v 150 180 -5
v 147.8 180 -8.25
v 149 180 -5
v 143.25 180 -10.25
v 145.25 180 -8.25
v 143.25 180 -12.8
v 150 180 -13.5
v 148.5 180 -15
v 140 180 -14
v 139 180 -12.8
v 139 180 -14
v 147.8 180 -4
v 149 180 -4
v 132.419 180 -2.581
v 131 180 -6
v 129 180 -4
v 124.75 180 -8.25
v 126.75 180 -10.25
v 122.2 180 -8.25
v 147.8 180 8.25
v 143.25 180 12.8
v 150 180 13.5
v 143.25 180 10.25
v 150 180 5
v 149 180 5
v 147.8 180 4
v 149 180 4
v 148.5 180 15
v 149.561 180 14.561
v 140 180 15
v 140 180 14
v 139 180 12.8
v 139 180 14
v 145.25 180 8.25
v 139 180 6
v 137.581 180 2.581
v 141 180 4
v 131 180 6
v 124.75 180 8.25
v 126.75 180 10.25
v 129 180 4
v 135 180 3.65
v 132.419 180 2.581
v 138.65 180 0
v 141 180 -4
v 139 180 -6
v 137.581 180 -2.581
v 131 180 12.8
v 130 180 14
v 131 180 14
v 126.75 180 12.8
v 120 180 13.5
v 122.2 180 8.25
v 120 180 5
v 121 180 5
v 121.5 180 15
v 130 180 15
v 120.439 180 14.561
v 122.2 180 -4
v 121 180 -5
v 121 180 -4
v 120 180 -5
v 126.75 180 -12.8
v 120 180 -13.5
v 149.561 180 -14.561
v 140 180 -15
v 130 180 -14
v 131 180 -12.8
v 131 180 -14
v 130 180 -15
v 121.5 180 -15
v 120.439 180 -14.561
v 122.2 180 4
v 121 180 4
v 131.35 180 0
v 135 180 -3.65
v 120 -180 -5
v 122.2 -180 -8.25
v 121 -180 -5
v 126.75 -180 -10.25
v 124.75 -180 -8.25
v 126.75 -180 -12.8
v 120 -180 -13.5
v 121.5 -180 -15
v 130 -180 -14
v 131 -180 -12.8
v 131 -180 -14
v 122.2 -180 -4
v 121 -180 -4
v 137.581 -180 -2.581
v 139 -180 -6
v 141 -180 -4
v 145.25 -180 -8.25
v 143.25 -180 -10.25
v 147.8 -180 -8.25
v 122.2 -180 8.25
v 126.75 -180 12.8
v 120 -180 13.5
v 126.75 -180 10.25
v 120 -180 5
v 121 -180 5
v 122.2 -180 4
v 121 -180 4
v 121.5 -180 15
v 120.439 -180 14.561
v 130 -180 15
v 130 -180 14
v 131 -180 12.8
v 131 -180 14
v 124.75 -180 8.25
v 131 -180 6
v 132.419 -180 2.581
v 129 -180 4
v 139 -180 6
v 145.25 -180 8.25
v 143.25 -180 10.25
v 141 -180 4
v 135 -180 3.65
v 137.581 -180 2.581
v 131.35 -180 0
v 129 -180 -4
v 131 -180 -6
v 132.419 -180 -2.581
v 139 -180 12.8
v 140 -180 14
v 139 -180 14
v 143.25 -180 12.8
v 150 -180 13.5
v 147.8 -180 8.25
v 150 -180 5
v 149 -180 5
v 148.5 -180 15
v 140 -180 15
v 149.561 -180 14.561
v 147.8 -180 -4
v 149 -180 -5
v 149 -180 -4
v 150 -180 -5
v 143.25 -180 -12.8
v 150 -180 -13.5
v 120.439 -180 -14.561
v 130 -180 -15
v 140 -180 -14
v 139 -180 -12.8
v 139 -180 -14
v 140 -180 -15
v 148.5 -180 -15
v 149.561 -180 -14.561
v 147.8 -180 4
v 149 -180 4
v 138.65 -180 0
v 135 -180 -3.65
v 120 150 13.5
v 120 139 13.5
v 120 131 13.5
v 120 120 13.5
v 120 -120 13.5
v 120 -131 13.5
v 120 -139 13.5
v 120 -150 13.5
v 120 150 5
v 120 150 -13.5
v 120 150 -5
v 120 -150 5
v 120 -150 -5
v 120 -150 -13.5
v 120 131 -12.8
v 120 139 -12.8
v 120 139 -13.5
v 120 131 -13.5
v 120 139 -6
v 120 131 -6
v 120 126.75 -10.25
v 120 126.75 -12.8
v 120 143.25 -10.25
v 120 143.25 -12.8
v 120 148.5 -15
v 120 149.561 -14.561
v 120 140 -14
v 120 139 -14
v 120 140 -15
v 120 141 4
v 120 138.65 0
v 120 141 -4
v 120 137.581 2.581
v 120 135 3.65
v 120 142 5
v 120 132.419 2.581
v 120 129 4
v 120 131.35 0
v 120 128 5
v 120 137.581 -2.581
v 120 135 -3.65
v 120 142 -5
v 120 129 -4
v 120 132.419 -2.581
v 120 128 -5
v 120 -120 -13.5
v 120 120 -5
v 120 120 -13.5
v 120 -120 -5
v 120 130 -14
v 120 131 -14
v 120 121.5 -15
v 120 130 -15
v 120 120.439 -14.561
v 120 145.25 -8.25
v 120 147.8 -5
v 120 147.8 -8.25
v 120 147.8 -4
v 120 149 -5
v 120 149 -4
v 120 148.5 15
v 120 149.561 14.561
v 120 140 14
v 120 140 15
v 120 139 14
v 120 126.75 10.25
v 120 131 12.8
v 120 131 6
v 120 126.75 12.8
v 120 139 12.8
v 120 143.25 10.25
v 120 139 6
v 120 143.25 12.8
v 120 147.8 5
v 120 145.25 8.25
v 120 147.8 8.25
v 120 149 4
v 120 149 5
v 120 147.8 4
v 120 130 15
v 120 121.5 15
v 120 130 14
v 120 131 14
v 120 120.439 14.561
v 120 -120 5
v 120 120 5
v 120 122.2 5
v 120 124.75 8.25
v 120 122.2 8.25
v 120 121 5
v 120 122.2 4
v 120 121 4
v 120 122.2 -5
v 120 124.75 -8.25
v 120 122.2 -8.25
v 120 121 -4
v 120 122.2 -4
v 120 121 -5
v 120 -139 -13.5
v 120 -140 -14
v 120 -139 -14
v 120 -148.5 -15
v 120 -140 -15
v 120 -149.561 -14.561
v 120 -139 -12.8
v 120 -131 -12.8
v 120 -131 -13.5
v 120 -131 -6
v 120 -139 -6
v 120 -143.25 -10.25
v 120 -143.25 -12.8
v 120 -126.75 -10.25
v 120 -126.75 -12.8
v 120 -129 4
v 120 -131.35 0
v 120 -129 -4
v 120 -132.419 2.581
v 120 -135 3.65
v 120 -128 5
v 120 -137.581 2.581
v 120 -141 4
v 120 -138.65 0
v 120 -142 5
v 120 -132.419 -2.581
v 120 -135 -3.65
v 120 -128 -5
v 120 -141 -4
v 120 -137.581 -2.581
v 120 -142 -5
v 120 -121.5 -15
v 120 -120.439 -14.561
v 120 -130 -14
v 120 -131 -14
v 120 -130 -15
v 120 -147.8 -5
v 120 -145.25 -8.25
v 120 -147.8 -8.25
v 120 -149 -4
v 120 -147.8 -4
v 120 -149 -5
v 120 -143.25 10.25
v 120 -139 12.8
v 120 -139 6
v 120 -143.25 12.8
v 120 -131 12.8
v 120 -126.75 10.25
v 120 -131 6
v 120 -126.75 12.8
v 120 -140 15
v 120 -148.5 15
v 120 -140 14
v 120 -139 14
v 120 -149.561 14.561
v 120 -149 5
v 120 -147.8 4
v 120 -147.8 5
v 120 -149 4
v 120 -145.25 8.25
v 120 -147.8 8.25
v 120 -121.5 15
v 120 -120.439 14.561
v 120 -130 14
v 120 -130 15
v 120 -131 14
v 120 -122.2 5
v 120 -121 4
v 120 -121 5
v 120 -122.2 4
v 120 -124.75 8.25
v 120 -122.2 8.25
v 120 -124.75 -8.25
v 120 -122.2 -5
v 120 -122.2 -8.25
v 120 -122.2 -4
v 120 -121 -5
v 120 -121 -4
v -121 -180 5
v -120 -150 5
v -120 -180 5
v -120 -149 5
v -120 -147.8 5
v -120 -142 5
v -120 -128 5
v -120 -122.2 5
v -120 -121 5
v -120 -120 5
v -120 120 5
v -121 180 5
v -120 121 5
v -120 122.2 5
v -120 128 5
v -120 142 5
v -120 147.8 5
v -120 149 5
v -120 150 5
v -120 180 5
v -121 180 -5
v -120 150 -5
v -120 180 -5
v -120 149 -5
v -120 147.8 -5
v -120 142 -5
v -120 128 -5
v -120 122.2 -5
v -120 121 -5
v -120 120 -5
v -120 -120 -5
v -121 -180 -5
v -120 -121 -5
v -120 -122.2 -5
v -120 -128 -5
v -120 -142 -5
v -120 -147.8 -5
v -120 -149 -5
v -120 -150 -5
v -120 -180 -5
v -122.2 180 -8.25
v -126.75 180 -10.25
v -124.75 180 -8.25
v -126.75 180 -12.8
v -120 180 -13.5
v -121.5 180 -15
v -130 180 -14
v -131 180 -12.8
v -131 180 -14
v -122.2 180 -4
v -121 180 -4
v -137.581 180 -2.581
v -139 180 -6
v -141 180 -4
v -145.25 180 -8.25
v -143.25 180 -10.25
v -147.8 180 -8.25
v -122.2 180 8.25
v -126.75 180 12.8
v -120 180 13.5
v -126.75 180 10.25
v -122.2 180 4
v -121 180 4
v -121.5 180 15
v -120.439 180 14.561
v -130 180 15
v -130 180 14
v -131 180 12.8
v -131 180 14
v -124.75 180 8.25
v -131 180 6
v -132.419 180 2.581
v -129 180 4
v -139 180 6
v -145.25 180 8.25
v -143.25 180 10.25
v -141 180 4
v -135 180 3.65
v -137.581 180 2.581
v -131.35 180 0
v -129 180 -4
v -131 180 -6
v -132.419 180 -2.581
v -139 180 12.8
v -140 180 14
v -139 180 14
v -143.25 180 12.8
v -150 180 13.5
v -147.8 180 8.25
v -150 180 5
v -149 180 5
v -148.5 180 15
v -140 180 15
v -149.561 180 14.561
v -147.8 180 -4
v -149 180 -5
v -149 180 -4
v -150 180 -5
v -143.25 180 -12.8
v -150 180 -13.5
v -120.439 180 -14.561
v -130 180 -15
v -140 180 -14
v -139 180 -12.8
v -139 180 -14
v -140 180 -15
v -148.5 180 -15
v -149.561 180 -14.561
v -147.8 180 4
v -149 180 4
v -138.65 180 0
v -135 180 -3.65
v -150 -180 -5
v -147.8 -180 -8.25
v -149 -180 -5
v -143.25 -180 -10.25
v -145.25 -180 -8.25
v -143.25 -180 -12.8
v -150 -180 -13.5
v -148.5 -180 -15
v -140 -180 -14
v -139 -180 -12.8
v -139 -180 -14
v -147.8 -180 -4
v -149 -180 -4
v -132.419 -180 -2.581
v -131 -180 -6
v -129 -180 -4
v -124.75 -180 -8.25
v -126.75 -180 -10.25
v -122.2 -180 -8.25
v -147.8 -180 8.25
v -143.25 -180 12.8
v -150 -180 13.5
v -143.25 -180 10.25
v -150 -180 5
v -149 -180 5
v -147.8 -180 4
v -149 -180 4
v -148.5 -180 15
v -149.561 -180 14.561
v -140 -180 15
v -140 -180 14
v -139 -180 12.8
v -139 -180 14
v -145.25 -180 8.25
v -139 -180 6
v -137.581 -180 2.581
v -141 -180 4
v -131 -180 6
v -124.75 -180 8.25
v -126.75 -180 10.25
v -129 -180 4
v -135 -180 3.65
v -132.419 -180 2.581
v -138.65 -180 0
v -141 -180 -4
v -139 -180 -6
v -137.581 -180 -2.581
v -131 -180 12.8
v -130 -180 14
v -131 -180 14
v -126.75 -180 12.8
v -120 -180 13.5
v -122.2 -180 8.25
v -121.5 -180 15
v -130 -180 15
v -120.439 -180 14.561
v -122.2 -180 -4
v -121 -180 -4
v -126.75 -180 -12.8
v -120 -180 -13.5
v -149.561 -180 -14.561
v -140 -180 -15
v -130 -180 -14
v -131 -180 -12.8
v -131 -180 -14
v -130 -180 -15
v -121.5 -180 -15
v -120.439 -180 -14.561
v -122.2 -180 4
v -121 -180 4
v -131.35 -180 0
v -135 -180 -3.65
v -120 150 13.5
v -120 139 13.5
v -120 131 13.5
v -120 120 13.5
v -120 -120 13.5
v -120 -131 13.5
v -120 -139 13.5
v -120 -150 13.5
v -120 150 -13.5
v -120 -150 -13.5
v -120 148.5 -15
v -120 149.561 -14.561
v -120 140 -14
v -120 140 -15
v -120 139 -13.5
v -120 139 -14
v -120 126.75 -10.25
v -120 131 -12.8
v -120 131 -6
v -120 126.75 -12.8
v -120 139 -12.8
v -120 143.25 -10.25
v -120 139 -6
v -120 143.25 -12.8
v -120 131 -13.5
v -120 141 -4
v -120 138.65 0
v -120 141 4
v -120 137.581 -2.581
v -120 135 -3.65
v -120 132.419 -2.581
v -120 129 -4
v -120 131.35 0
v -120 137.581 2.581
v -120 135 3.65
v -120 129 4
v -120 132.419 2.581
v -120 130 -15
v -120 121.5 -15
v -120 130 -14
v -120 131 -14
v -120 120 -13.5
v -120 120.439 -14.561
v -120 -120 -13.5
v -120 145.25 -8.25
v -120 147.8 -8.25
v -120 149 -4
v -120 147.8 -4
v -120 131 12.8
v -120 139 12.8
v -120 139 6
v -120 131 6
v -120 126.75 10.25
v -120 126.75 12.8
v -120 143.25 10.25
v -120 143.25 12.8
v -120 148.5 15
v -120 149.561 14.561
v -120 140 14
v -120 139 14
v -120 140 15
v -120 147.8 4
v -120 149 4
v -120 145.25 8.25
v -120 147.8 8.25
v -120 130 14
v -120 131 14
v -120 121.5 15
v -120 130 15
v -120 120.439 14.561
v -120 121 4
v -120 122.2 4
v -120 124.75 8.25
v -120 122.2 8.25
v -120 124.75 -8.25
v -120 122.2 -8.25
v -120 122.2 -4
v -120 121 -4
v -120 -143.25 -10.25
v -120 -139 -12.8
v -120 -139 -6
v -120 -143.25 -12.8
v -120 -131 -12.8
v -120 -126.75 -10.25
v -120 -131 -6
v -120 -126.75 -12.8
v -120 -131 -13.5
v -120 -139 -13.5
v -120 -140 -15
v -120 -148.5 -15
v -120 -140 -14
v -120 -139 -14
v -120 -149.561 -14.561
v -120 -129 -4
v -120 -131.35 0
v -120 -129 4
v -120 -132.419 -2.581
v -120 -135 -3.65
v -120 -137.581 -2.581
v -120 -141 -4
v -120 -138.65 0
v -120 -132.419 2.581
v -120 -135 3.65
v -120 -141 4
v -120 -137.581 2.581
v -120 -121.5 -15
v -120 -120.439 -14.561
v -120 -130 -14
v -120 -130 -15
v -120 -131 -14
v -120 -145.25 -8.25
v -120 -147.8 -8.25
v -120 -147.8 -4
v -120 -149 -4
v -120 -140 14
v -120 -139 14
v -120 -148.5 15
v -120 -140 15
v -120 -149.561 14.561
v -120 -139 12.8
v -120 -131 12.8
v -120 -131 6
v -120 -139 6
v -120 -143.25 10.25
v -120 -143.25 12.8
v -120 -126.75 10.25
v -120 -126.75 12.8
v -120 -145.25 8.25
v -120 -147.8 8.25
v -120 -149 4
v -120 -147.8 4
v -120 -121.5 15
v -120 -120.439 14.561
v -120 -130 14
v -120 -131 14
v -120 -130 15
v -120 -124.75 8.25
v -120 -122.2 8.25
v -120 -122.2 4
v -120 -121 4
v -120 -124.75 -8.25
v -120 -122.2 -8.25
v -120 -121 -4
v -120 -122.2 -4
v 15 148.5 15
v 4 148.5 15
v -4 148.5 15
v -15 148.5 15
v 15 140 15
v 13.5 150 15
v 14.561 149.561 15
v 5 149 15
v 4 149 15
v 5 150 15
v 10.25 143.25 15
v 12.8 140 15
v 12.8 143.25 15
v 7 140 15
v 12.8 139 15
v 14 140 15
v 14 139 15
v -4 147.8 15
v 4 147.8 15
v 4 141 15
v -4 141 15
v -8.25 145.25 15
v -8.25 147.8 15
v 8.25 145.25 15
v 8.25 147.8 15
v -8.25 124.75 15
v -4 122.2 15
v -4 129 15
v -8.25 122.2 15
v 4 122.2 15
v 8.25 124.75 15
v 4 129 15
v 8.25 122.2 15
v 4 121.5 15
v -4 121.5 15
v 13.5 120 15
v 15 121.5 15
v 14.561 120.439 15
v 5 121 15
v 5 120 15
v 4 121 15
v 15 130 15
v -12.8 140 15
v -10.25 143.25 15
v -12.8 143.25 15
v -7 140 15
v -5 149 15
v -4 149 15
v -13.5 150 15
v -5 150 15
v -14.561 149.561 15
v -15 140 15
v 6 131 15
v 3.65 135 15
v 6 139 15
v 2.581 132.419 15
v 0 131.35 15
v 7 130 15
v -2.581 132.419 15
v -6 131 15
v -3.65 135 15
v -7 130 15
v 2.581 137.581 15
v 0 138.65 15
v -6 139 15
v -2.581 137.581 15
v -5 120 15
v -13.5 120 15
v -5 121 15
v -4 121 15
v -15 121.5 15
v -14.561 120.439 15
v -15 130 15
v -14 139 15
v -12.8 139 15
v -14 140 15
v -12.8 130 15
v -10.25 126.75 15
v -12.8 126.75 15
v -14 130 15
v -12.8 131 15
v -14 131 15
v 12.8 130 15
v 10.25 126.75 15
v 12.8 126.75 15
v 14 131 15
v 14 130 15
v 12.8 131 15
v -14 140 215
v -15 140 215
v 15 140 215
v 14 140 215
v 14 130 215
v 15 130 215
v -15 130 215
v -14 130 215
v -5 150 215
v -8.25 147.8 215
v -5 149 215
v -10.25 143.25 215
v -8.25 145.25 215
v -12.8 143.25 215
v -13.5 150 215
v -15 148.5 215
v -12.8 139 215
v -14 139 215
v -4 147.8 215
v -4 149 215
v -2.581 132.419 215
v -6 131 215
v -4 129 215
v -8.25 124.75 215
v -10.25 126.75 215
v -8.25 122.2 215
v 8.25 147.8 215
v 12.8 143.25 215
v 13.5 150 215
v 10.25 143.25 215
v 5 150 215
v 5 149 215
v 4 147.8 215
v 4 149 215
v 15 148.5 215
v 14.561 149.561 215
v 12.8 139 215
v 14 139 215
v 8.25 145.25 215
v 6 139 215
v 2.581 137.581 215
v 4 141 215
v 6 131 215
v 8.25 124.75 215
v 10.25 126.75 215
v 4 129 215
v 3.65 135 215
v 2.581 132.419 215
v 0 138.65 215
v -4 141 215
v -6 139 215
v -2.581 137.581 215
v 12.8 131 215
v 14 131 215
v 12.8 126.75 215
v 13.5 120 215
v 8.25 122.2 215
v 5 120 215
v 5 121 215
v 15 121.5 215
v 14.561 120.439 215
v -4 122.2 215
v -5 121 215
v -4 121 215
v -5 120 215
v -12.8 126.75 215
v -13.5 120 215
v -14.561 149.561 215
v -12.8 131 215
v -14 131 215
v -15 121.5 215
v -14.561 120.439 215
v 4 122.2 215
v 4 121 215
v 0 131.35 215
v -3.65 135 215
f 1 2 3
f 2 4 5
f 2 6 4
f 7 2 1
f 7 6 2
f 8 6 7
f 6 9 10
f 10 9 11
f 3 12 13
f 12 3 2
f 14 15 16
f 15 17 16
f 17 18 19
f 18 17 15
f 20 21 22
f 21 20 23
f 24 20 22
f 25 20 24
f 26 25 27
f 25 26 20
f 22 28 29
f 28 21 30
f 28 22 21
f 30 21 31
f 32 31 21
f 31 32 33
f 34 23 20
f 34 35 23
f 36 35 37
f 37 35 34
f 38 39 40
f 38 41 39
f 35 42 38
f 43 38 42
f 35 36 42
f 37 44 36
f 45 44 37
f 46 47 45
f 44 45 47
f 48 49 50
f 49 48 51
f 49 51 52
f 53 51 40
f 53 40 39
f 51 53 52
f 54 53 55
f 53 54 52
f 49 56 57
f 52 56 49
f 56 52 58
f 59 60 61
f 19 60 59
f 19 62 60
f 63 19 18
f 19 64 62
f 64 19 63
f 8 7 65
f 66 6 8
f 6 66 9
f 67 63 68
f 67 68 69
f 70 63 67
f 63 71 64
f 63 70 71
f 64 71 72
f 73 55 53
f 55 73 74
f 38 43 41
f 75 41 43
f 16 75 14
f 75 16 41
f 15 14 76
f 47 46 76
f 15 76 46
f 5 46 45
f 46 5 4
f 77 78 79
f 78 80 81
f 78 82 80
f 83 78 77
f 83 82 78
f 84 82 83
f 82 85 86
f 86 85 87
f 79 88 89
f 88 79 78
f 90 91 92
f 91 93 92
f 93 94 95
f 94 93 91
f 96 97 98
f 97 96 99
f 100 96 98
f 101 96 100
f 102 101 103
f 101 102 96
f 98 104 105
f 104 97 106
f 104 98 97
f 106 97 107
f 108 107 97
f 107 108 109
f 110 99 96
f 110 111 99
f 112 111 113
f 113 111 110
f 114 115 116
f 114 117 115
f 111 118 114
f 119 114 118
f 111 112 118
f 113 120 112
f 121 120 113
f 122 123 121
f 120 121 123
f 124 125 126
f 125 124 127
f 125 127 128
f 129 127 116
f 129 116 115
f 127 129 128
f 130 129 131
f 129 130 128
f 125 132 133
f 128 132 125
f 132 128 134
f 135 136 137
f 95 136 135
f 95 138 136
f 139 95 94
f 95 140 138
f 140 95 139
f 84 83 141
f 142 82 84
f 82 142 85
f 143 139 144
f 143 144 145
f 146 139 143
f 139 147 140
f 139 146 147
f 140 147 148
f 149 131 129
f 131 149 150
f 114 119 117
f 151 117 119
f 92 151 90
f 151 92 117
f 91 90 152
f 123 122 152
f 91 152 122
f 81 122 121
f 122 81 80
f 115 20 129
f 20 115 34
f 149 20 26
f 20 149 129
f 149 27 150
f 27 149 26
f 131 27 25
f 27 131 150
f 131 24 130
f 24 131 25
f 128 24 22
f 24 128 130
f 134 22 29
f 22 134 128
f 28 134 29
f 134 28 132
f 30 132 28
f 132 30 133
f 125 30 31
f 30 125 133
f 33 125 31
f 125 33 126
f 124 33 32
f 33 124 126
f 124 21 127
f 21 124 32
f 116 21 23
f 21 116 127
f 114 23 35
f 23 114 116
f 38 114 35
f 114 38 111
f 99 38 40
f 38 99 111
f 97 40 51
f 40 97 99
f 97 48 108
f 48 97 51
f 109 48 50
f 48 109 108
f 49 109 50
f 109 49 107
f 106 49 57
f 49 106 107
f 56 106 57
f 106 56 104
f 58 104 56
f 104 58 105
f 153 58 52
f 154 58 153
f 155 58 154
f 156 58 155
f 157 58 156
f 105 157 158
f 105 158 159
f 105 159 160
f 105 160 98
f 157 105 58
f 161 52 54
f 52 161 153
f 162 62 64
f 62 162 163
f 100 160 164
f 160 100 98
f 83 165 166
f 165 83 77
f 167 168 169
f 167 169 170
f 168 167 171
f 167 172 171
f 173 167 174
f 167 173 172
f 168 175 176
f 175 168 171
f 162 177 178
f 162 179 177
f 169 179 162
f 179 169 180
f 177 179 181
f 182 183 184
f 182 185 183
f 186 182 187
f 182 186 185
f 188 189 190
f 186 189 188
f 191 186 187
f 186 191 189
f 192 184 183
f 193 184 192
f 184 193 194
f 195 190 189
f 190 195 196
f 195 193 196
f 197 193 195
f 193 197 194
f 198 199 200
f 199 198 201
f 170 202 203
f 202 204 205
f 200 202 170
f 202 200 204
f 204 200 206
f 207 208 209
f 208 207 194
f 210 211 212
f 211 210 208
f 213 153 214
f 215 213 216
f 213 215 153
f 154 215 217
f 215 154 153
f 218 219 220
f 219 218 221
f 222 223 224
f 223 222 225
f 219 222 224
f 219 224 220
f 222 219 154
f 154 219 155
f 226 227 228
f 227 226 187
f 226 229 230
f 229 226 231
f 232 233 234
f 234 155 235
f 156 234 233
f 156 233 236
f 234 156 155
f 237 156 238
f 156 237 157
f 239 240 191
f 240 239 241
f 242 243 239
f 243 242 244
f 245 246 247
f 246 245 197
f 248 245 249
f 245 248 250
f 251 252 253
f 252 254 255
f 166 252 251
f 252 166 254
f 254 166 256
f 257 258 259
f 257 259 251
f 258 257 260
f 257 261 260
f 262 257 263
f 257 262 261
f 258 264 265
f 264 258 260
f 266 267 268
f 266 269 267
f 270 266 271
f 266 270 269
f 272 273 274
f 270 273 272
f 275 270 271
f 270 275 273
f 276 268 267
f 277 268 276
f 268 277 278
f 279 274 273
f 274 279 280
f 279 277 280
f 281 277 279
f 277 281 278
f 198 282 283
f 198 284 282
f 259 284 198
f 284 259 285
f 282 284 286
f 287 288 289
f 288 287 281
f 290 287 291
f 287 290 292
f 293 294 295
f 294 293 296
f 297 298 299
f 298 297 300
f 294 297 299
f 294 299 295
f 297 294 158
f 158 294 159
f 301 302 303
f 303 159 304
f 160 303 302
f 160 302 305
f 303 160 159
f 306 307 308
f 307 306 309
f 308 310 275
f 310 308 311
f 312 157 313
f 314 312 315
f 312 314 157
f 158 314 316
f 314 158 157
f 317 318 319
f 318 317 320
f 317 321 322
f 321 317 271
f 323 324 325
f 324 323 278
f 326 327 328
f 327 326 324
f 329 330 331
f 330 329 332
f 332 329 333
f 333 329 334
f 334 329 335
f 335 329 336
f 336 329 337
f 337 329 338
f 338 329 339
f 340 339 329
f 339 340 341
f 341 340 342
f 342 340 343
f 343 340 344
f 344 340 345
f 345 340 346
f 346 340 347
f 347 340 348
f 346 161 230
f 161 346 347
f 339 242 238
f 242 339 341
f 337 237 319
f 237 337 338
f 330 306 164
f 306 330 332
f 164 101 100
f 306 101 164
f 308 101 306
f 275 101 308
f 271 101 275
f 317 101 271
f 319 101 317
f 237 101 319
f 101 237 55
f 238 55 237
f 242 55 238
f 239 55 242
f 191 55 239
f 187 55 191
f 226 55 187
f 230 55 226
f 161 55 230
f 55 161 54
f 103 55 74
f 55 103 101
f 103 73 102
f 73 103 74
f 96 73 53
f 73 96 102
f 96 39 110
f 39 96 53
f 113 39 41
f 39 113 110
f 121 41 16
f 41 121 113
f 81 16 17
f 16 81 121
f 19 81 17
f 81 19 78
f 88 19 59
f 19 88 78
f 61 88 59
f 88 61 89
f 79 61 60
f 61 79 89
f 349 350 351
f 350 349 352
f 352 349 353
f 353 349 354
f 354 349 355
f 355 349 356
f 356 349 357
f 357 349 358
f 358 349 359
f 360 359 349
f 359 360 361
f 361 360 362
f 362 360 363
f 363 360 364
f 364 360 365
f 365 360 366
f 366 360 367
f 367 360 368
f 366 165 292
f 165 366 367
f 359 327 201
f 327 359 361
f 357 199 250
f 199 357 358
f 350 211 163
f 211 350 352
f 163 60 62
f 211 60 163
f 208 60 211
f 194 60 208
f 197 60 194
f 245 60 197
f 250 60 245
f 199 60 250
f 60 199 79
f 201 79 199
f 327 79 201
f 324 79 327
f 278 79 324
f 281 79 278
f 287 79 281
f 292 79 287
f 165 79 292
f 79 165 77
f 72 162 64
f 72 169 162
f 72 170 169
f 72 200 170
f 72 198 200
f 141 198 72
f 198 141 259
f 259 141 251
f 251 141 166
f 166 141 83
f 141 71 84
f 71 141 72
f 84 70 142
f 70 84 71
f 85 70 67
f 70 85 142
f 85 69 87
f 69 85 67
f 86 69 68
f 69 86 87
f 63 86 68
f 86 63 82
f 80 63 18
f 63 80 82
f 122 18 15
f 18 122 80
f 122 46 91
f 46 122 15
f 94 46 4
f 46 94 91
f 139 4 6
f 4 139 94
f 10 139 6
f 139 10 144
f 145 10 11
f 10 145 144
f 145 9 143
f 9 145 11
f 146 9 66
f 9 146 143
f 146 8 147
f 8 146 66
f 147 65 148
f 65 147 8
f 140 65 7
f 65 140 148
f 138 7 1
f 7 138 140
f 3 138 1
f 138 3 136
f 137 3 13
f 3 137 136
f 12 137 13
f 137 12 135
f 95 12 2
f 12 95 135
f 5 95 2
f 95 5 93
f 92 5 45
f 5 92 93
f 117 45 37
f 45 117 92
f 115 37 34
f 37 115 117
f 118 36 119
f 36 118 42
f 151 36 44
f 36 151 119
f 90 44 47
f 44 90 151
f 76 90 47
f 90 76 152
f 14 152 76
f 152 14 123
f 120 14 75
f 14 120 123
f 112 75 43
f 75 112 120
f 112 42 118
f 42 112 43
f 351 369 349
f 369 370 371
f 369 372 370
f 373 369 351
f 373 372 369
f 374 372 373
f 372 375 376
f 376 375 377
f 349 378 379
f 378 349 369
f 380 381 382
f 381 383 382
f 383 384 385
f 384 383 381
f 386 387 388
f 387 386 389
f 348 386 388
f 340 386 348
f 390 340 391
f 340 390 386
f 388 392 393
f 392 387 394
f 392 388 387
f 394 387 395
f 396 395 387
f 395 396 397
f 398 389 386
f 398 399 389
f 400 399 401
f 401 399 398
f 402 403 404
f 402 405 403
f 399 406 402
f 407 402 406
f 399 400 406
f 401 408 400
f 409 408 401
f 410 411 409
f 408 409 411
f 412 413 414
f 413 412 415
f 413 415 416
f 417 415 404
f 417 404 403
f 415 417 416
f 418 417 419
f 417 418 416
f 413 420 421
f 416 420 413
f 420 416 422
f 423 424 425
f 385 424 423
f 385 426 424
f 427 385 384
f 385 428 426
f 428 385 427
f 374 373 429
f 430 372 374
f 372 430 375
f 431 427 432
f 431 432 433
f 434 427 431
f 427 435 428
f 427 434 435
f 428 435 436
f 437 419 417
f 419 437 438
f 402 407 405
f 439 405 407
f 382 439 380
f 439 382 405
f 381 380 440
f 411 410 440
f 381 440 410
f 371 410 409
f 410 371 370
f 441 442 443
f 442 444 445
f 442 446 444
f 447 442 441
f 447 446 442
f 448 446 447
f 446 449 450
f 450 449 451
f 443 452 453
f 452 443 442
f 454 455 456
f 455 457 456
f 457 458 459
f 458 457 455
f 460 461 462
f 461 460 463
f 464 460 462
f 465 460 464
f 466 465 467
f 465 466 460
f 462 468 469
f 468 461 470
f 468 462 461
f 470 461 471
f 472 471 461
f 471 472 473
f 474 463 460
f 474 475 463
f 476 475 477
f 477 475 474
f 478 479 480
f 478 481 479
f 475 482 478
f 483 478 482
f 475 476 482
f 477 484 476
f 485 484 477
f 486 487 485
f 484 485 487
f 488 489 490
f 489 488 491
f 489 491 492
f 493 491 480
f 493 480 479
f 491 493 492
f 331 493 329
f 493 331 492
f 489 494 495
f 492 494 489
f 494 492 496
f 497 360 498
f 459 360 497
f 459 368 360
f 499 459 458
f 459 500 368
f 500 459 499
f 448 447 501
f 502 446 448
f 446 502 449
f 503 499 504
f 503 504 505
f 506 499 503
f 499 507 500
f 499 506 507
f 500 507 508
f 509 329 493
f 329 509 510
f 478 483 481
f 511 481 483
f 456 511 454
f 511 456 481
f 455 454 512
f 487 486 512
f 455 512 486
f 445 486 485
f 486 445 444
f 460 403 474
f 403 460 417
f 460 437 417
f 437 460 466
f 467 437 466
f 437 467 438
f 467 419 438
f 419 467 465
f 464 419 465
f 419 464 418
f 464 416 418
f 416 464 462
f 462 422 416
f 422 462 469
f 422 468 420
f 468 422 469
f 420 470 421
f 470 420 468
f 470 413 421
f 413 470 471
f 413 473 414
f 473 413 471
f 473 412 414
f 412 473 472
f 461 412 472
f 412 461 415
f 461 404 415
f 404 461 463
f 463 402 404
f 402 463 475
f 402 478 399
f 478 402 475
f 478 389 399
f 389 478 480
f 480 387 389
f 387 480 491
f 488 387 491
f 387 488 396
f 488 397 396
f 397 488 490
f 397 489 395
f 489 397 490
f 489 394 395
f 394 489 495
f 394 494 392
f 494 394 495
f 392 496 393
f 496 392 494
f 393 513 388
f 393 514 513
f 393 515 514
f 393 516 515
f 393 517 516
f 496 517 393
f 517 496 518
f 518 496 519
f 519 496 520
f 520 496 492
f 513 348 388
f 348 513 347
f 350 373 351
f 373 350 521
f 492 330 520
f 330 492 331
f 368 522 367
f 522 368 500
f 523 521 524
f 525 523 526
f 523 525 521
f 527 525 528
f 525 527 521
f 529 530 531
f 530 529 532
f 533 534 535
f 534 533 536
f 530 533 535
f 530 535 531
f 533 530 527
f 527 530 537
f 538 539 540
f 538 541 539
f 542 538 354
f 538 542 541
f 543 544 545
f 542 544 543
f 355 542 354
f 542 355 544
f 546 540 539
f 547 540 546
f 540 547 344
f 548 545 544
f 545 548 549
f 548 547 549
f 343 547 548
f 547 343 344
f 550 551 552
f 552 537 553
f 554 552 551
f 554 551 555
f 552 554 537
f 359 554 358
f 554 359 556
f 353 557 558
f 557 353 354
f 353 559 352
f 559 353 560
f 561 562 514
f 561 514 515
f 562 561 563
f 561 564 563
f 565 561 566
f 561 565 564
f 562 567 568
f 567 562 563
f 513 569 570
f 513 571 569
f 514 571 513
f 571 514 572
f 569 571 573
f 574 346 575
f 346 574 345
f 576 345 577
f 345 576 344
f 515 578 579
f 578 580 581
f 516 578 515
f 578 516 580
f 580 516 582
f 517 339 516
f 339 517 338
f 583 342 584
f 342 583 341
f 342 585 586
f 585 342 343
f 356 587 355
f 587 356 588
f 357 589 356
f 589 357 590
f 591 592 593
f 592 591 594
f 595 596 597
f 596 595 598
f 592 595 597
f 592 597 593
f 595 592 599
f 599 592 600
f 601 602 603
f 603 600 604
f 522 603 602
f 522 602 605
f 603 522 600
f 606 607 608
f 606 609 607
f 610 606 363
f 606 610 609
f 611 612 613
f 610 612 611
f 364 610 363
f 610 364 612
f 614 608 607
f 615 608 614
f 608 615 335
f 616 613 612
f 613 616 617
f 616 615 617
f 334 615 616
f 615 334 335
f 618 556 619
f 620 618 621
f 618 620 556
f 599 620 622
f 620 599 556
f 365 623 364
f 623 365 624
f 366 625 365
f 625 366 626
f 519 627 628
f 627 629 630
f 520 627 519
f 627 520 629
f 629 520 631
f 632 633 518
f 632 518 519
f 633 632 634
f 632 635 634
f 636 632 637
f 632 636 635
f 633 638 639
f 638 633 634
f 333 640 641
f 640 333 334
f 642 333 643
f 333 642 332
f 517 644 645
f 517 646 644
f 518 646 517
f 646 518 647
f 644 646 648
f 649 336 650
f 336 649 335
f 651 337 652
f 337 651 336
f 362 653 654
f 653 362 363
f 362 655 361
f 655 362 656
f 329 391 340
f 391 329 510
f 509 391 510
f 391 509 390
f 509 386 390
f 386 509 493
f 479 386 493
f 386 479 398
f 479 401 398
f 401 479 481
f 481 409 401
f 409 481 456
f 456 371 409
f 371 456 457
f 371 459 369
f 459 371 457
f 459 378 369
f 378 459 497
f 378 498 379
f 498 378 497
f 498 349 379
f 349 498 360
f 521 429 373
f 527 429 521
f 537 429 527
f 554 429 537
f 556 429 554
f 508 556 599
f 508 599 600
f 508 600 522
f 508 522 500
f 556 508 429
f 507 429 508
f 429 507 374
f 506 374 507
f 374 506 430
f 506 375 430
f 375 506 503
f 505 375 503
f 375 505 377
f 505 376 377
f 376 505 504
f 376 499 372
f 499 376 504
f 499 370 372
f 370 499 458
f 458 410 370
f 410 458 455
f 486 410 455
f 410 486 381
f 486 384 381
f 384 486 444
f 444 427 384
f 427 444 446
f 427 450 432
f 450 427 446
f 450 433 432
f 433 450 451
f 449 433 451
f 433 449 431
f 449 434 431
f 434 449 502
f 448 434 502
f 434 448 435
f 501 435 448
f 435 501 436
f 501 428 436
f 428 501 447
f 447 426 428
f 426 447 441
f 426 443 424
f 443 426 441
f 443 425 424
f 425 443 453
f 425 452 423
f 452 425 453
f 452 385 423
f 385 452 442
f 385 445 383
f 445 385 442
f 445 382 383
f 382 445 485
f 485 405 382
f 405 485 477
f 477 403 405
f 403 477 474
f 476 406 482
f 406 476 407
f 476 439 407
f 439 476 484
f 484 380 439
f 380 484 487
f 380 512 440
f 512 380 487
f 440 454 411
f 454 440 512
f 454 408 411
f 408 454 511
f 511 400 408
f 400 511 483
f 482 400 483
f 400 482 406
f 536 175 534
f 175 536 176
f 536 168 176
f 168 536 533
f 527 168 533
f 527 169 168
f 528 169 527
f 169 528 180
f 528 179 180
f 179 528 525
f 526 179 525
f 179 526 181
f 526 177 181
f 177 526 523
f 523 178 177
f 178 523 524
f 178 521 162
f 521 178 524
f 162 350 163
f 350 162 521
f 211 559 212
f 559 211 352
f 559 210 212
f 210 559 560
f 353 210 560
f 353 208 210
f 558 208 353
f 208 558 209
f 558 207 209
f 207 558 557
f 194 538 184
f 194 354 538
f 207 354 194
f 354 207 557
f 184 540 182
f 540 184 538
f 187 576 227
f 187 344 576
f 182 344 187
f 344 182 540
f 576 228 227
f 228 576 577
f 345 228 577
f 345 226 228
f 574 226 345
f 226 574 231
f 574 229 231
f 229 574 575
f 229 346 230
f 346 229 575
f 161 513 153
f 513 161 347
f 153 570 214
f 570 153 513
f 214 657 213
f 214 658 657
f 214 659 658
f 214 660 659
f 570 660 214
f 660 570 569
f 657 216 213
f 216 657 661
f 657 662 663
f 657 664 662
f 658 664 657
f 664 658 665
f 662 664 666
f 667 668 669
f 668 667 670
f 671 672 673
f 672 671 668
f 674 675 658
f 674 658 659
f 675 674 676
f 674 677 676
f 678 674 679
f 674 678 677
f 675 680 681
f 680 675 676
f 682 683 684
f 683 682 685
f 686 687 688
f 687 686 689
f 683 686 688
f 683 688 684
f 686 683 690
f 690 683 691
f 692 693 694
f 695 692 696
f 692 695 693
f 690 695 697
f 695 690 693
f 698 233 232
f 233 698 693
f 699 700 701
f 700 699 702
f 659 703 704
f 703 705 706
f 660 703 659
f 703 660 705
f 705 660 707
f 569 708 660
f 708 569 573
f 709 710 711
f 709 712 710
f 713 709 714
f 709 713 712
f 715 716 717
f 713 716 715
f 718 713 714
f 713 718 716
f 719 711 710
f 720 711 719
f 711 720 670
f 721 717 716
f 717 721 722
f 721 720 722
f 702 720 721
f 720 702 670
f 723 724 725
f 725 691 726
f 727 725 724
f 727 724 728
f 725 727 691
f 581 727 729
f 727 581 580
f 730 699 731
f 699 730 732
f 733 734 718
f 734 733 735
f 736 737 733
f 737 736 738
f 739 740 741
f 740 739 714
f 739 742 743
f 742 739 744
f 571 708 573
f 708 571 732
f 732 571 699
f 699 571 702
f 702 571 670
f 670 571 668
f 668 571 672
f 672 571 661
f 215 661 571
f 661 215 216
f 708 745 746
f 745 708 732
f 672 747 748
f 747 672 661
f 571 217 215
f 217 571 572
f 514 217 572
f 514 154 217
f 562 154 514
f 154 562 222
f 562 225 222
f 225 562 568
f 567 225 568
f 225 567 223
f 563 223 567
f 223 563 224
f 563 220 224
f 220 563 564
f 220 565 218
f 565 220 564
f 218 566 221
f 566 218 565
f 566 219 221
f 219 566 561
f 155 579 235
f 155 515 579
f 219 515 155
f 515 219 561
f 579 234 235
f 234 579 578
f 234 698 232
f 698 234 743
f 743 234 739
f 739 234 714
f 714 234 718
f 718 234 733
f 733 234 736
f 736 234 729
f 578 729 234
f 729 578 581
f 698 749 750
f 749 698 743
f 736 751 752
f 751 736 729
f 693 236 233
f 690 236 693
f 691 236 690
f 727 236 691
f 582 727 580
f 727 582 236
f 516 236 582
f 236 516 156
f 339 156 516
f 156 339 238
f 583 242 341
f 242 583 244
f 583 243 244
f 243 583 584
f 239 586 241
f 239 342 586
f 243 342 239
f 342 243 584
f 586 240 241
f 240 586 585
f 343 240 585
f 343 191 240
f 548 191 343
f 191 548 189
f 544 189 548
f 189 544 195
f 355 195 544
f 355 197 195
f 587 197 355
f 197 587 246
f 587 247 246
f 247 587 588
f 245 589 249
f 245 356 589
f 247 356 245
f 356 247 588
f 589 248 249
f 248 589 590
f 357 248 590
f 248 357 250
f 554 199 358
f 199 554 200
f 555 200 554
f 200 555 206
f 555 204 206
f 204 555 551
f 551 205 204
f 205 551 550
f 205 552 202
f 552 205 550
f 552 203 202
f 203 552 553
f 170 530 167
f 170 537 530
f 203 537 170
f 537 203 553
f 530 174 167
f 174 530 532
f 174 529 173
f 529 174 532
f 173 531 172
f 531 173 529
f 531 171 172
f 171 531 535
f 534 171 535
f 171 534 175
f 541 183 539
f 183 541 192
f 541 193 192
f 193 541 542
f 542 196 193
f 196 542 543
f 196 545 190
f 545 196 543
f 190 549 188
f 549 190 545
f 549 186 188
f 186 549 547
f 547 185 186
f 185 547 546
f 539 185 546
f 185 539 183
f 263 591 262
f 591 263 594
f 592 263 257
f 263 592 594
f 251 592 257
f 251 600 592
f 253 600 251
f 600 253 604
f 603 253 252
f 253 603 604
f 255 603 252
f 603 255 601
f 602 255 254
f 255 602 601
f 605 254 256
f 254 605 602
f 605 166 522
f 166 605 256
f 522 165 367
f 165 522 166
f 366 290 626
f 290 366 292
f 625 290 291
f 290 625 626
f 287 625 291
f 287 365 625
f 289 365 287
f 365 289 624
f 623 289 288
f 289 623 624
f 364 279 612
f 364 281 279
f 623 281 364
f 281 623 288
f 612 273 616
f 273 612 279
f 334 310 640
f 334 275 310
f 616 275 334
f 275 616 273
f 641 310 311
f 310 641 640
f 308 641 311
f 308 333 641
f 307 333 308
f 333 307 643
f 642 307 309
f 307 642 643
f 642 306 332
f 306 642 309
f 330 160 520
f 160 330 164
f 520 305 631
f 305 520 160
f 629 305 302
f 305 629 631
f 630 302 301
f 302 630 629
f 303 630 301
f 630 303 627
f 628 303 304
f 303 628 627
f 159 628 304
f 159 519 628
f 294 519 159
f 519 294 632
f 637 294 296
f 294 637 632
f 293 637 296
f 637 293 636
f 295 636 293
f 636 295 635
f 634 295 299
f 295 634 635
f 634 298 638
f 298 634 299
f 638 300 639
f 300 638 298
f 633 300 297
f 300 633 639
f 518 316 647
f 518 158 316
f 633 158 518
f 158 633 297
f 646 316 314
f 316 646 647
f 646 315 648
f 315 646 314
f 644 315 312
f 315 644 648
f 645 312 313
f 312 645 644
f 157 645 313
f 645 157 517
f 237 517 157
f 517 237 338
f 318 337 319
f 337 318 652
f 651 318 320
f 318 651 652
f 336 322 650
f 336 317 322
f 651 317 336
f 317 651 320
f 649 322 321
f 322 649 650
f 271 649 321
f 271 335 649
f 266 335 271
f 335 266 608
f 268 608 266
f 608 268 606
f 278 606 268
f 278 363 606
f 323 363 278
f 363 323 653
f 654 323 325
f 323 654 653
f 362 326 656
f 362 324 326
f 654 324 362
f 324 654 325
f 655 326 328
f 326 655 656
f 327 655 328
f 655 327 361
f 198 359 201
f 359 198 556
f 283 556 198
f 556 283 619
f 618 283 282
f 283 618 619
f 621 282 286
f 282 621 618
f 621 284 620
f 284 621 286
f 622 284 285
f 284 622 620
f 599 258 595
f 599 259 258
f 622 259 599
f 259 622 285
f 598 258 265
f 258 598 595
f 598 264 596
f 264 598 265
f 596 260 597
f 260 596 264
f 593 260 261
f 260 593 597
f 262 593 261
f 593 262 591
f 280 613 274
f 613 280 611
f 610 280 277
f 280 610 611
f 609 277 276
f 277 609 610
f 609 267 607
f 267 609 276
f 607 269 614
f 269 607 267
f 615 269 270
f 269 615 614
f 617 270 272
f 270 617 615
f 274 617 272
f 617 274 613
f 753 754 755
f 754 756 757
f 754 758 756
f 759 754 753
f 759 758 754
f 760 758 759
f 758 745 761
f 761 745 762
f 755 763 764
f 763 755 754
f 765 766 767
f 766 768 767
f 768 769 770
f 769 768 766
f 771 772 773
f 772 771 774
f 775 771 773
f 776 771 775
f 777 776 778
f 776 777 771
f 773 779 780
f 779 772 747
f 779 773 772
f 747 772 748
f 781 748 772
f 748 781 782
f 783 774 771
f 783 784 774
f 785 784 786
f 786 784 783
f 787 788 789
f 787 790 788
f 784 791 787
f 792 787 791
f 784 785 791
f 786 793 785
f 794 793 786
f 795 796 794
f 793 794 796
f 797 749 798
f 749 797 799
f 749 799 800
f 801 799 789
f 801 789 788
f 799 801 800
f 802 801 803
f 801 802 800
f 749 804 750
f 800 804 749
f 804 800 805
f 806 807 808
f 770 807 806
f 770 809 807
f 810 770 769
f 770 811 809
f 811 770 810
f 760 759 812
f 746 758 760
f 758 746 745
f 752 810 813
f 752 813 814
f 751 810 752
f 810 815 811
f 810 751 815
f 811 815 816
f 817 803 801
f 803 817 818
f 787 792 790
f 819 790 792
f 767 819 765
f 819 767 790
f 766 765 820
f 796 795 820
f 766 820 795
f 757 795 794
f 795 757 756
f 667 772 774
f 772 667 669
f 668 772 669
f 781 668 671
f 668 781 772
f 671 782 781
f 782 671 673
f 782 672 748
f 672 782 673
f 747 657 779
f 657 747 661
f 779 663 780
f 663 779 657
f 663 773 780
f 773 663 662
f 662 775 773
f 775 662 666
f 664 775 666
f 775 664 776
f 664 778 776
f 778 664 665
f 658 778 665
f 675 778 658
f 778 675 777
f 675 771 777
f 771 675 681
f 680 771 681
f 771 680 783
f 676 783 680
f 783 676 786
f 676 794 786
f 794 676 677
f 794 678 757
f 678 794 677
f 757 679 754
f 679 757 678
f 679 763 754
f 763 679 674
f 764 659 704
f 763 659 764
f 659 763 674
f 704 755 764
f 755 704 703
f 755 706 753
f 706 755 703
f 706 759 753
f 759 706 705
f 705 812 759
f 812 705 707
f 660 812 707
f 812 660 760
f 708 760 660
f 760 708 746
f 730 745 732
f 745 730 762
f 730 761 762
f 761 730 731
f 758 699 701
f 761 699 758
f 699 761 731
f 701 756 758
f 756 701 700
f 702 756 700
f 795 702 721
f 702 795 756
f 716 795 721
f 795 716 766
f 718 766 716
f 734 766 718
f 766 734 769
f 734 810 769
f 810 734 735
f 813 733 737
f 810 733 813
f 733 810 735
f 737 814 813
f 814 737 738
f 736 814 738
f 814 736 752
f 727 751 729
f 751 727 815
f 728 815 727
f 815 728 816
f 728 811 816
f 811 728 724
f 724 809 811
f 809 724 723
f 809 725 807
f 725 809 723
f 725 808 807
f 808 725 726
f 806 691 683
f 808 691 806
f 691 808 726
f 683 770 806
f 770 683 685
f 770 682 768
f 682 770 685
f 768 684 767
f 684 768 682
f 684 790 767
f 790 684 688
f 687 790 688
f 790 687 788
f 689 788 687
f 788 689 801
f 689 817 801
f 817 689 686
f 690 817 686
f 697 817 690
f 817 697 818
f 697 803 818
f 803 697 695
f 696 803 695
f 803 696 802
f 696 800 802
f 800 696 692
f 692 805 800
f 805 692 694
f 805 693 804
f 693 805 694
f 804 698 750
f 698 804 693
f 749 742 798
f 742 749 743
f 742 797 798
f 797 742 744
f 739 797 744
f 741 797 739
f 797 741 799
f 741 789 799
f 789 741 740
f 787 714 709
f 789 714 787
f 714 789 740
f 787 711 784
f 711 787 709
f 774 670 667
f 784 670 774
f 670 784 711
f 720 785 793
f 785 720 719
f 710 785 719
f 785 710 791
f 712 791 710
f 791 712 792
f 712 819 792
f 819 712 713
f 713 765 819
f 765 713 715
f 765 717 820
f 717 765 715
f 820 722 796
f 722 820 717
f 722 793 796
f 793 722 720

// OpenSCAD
// file: ../Booster/Common.scad
module screws(outerDiameter, count, diameter, length) {
    for(i=[0:count-1]) rotate([0,0,i*(360/count)]) translate([outerDiameter/2, 0, 0]) rotate([0,-90,0]) cylinder(d=diameter*0.8,h=length);
}

module ring(d, w, h) {
    difference() {
        cylinder(d=d,h=h);
        translate([0,0,-.1]) cylinder(d=d-w*2,h=h+.2);
    }
}
// file: ../Booster/SimpleNozzle.scad
use <Common.scad>

module simple_nozzle(diameter, throat, throatLength, bellWidth, bellLength, bellBottomDiameter, height) {
    difference() {
        union() {
            cylinder(d=diameter, h=height);
            translate([0,0,height]) cylinder(d1=throat + 2*bellWidth, d2=bellBottomDiameter + 2*bellWidth, h= bellLength);
        }
        translate([0,0,-5]) cylinder(d=throat, h=height+10);
        translate([0,0,height-1]) cylinder(d1=throat, d2=bellBottomDiameter, h=bellLength+2);
        translate([0,0,-0.1]) cylinder(d1=diameter,d2=throat,h=10);
        translate([0,0,8]) ring(d=diameter+0.1, w=4.5, h=5.1);
    }
    /*translate([0,0,-10]) */
}
// file: ../Booster/Plug.scad
use <Common.scad>

module plug(diameter, height, numberOfScrews = 4, holderScrew = 6.4) {
    difference() {
        cylinder(d=diameter, h=height);
        translate([0,0,17.5]) screws(diameter, numberOfScrews, 5, 9.9);
        translate([0,0,3]) ring(d=diameter+0.1, w=1.05, h=3);
        translate([0,0,9]) ring(d=diameter+0.1, w=1.05, h=3);
        translate([0,0,height-10]) cylinder(d=holderScrew,h=10.1);
    }
}
// file: ../Booster/Chamber.scad
use <Common.scad>

module chamber(height, diameter, wall, numberOfScrews = 4) {
    difference() {
        cylinder(d=diameter + 2 * wall, h=height);
        translate([0,0,-5]) cylinder(d=diameter, h=height+10);
        translate([0,0,5.5]) screws(diameter+2*wall, numberOfScrews, 5, wall);
        translate([0,0,height-5.5]) screws(diameter+2*wall, numberOfScrews, 5, wall);
    }
}
// file: ../Booster/Nozzle.scad
use <Common.scad>

module nozzle(diameter, numberOfScrews = 4, holderScrew = 6.4) {
    difference() {
        rotate_extrude()
        rotate([180,0,90])
        _2d_nozzle(outerRadius = diameter / 2, expansionRatio = 2, throat = 5, bellWidth = 2, divergence = 45);

        translate([0,0,-5.5]) screws(diameter, numberOfScrews, 5, 9.9);
        translate([0,0,-14]) ring(d=diameter+0.1, w=1.05, h=3);
        translate([0,0,-20]) ring(d=diameter+0.1, w=1.05, h=3);
    }
}

module _2d_nozzle(outerRadius, expansionRatio, bellWidth, throat, convergence = 30, divergence = 30) {
    a1 = (2.5 * throat) - (1.5 * throat * cos(convergence));
    b1 = (1.5 * throat) * sin(convergence);

    y0 = (1.382 * throat) - (0.382 * throat * cos(divergence));
    x0 = (0.382 * throat) * sin(divergence);

    exitRadius = sqrt(expansionRatio) * throat;

    translate([0,throat+1.5*throat,0]) difference() {
        circle(r=1.5 * throat);
        translate([0,-1.5*throat,0]) square([1.5*throat, 3*throat]);
    }
    translate([0,throat+0.382*throat,0]) intersection() {
        circle(r=0.382 * throat);
        translate([0,-0.382*throat,0]) square([0.382*throat, 0.382*throat]);
    }
    polygon(points = [[-b1, a1], [0, a1], [0, outerRadius], [-b1, outerRadius], [-b1-((outerRadius - a1)*tan(90-convergence)), outerRadius]]);
    translate([x0, y0, 0]) {
        /*% polygon(points = [[-((outerRadius - y0)*tan(90-divergence)), -outerRadius+y0], [0, 0], [((outerRadius - y0)*tan(90-divergence)), outerRadius-y0], [x0, outerRadius-y0]]);*/

        step = 1/$fn;
        startY = sqrt(pow(1/(2 * tan(divergence)), 2)); // x0 - pow(y0,2); // 2 * tan(divergence);

        startX = pow(startY, 2);
        /*polygon(points=[[-x0, startY+bellWidth], [-x0, startY], [startX, startY], [startX, -y0]]);*/
        translate([-startX, -startY, 0]) {
            polygon(points = [[startX, startY], [startX, startY+bellWidth], [startX-x0, startY+bellWidth], [startX-x0, startY]]);
            step = 1/$fn;
            for(y1=[startY:step:exitRadius-step]) {
                x1 = pow(y1, 2);
                y2 = y1+step;
                x2 = pow(y2, 2);
                polygon(points = [[x1, y1], [x2, y2], [x2, y2+bellWidth], [x1, y1+bellWidth]]);
            }
        }
    }
}
// file: extrusion_profile.scad
// Aleksandr Saechnikov 09 june 2015

extrusion_profile(height=100, size=30);

module extrusion_profile(size=30, height=10, radius=1.5, step=1) {

	linear_extrude(height=height) {
		union() {
			sub_extrusion_profile(size, radius, step);
			rotate([0,0,90])  sub_extrusion_profile(size, radius, step);
			rotate([0,0,180]) sub_extrusion_profile(size, radius, step);
			rotate([0,0,270]) sub_extrusion_profile(size, radius, step);
		}
	}
}

module sub_extrusion_profile(size=30, radius = 1.5, step=0.5) {

	reSize = size/30; // Scalling

	k0 = 0;
	k2 = 3.65*reSize;
	k1 = k2*cos(45);

	k3 = 4*reSize;
	k4 = 6*reSize;
	k5 = 8.25*reSize; k5_2 = k5 + k4 - k3;
	k6 = 12.8*reSize;
	k7 = 15*reSize;

	_radius = radius;// OR  *reSize -- Corner radius
	_step = step;    // OR  *reSize -- Step size

	polygon(points=[
		[k1,k1],[0,k2], // Center hole
		[0,k4],[k3,k4],[k5,k5_2],[k5,k6],[k3,k6],
		[k3,k7-_step],[k3+_step,k7-_step],[k3+_step,k7], //Step
		[k7-_radius,k7],[k7-_radius*(1.-cos(45)),k7-_radius*(1.-cos(45))],[k7,k7-_radius],// Corner
		[k7,k3+_step],[k7-_step,k3+_step],[k7-_step,k3], // Step
		[k6,k3],[k6,k5],[k5_2,k5],[k4,k3],[k4,0],
		[k2,0]  // Center hole
	]);
}
// file: ../Booster/Booster.scad
use <Nozzle.scad>
use <Chamber.scad>
use <Plug.scad>
use <SimpleNozzle.scad>

/* module topPlug(radius, height) {
    cylinder(h = height, r = radius);
}

topPlug(radius = 50, height = 10); */


$fn = 100;

// Working in mm
chamberHeight = 250;
chamberDiameter = 41;
chamberWallWidth = 2;
plugHeight = 23;
nozzleThroat = 7;
nozzleThroatLength = 5.55;
nozzleBellWidth = 2;
nozzleBellLength = 40;
nozzleBellBottomDiameter = 25.47;

$vpr = [45, 0, 45];
$vpt = [0, 0, chamberHeight / 2];
$vpd = 1000;

/*booster(boosterHeight, boosterDiameter, boosterWallWidth, boosterPlugHeight, boosterNozzleThroat);*/

module booster() {
    union() {
        chamber(chamberHeight, chamberDiameter, chamberWallWidth);
        translate([0,0,plugHeight]) rotate([0,180,0]) plug(chamberDiameter, plugHeight);
        translate([0,0,chamberHeight])
        //nozzle(chamberDiameter);
        simple_nozzle(chamberDiameter, nozzleThroat, nozzleThroatLength, nozzleBellWidth, nozzleBellLength, nozzleBellBottomDiameter, plugHeight);
    }
}
// main file
use <../Booster/Booster.scad>
use <extrusion_profile.scad>

$vpr = [45, 0, 45];
$vpt = [0, 0, 125];
$vpd = 1000;

module loadCell() {
    // cube([width,depth,height], center)
}
module loadTransferWedge() {

}

// booster();

module copy_mirror(vec=[0,1,0]) {
    children();
    mirror(vec) children();
}

module base(width, height) {
    size = 30;
    widthDelta = width / 2 - size / 2;
    heightDelta = height / 2 - size / 2;
    adjustedWidth = width + size * 2;
    adjustedHeight = height - size * 2;

    // Outer profiles
    rotate([90, 0, 0])
    copy_mirror([1, 0, 0])
    translate([widthDelta, 0, - adjustedWidth / 2])
    extrusion_profile(height = adjustedWidth, size = size);

    rotate([0, 90, 0])
    copy_mirror([0, 1, 0])
    translate([0, heightDelta, - adjustedHeight / 2])
    extrusion_profile(height = adjustedHeight, size = size);

    translate([0, heightDelta, size / 2])
    extrusion_profile(height = /* booster height */200, size = size);
}

/* extrusion_profile(height=100, size=30); */

base(width = 300, height = 300);
